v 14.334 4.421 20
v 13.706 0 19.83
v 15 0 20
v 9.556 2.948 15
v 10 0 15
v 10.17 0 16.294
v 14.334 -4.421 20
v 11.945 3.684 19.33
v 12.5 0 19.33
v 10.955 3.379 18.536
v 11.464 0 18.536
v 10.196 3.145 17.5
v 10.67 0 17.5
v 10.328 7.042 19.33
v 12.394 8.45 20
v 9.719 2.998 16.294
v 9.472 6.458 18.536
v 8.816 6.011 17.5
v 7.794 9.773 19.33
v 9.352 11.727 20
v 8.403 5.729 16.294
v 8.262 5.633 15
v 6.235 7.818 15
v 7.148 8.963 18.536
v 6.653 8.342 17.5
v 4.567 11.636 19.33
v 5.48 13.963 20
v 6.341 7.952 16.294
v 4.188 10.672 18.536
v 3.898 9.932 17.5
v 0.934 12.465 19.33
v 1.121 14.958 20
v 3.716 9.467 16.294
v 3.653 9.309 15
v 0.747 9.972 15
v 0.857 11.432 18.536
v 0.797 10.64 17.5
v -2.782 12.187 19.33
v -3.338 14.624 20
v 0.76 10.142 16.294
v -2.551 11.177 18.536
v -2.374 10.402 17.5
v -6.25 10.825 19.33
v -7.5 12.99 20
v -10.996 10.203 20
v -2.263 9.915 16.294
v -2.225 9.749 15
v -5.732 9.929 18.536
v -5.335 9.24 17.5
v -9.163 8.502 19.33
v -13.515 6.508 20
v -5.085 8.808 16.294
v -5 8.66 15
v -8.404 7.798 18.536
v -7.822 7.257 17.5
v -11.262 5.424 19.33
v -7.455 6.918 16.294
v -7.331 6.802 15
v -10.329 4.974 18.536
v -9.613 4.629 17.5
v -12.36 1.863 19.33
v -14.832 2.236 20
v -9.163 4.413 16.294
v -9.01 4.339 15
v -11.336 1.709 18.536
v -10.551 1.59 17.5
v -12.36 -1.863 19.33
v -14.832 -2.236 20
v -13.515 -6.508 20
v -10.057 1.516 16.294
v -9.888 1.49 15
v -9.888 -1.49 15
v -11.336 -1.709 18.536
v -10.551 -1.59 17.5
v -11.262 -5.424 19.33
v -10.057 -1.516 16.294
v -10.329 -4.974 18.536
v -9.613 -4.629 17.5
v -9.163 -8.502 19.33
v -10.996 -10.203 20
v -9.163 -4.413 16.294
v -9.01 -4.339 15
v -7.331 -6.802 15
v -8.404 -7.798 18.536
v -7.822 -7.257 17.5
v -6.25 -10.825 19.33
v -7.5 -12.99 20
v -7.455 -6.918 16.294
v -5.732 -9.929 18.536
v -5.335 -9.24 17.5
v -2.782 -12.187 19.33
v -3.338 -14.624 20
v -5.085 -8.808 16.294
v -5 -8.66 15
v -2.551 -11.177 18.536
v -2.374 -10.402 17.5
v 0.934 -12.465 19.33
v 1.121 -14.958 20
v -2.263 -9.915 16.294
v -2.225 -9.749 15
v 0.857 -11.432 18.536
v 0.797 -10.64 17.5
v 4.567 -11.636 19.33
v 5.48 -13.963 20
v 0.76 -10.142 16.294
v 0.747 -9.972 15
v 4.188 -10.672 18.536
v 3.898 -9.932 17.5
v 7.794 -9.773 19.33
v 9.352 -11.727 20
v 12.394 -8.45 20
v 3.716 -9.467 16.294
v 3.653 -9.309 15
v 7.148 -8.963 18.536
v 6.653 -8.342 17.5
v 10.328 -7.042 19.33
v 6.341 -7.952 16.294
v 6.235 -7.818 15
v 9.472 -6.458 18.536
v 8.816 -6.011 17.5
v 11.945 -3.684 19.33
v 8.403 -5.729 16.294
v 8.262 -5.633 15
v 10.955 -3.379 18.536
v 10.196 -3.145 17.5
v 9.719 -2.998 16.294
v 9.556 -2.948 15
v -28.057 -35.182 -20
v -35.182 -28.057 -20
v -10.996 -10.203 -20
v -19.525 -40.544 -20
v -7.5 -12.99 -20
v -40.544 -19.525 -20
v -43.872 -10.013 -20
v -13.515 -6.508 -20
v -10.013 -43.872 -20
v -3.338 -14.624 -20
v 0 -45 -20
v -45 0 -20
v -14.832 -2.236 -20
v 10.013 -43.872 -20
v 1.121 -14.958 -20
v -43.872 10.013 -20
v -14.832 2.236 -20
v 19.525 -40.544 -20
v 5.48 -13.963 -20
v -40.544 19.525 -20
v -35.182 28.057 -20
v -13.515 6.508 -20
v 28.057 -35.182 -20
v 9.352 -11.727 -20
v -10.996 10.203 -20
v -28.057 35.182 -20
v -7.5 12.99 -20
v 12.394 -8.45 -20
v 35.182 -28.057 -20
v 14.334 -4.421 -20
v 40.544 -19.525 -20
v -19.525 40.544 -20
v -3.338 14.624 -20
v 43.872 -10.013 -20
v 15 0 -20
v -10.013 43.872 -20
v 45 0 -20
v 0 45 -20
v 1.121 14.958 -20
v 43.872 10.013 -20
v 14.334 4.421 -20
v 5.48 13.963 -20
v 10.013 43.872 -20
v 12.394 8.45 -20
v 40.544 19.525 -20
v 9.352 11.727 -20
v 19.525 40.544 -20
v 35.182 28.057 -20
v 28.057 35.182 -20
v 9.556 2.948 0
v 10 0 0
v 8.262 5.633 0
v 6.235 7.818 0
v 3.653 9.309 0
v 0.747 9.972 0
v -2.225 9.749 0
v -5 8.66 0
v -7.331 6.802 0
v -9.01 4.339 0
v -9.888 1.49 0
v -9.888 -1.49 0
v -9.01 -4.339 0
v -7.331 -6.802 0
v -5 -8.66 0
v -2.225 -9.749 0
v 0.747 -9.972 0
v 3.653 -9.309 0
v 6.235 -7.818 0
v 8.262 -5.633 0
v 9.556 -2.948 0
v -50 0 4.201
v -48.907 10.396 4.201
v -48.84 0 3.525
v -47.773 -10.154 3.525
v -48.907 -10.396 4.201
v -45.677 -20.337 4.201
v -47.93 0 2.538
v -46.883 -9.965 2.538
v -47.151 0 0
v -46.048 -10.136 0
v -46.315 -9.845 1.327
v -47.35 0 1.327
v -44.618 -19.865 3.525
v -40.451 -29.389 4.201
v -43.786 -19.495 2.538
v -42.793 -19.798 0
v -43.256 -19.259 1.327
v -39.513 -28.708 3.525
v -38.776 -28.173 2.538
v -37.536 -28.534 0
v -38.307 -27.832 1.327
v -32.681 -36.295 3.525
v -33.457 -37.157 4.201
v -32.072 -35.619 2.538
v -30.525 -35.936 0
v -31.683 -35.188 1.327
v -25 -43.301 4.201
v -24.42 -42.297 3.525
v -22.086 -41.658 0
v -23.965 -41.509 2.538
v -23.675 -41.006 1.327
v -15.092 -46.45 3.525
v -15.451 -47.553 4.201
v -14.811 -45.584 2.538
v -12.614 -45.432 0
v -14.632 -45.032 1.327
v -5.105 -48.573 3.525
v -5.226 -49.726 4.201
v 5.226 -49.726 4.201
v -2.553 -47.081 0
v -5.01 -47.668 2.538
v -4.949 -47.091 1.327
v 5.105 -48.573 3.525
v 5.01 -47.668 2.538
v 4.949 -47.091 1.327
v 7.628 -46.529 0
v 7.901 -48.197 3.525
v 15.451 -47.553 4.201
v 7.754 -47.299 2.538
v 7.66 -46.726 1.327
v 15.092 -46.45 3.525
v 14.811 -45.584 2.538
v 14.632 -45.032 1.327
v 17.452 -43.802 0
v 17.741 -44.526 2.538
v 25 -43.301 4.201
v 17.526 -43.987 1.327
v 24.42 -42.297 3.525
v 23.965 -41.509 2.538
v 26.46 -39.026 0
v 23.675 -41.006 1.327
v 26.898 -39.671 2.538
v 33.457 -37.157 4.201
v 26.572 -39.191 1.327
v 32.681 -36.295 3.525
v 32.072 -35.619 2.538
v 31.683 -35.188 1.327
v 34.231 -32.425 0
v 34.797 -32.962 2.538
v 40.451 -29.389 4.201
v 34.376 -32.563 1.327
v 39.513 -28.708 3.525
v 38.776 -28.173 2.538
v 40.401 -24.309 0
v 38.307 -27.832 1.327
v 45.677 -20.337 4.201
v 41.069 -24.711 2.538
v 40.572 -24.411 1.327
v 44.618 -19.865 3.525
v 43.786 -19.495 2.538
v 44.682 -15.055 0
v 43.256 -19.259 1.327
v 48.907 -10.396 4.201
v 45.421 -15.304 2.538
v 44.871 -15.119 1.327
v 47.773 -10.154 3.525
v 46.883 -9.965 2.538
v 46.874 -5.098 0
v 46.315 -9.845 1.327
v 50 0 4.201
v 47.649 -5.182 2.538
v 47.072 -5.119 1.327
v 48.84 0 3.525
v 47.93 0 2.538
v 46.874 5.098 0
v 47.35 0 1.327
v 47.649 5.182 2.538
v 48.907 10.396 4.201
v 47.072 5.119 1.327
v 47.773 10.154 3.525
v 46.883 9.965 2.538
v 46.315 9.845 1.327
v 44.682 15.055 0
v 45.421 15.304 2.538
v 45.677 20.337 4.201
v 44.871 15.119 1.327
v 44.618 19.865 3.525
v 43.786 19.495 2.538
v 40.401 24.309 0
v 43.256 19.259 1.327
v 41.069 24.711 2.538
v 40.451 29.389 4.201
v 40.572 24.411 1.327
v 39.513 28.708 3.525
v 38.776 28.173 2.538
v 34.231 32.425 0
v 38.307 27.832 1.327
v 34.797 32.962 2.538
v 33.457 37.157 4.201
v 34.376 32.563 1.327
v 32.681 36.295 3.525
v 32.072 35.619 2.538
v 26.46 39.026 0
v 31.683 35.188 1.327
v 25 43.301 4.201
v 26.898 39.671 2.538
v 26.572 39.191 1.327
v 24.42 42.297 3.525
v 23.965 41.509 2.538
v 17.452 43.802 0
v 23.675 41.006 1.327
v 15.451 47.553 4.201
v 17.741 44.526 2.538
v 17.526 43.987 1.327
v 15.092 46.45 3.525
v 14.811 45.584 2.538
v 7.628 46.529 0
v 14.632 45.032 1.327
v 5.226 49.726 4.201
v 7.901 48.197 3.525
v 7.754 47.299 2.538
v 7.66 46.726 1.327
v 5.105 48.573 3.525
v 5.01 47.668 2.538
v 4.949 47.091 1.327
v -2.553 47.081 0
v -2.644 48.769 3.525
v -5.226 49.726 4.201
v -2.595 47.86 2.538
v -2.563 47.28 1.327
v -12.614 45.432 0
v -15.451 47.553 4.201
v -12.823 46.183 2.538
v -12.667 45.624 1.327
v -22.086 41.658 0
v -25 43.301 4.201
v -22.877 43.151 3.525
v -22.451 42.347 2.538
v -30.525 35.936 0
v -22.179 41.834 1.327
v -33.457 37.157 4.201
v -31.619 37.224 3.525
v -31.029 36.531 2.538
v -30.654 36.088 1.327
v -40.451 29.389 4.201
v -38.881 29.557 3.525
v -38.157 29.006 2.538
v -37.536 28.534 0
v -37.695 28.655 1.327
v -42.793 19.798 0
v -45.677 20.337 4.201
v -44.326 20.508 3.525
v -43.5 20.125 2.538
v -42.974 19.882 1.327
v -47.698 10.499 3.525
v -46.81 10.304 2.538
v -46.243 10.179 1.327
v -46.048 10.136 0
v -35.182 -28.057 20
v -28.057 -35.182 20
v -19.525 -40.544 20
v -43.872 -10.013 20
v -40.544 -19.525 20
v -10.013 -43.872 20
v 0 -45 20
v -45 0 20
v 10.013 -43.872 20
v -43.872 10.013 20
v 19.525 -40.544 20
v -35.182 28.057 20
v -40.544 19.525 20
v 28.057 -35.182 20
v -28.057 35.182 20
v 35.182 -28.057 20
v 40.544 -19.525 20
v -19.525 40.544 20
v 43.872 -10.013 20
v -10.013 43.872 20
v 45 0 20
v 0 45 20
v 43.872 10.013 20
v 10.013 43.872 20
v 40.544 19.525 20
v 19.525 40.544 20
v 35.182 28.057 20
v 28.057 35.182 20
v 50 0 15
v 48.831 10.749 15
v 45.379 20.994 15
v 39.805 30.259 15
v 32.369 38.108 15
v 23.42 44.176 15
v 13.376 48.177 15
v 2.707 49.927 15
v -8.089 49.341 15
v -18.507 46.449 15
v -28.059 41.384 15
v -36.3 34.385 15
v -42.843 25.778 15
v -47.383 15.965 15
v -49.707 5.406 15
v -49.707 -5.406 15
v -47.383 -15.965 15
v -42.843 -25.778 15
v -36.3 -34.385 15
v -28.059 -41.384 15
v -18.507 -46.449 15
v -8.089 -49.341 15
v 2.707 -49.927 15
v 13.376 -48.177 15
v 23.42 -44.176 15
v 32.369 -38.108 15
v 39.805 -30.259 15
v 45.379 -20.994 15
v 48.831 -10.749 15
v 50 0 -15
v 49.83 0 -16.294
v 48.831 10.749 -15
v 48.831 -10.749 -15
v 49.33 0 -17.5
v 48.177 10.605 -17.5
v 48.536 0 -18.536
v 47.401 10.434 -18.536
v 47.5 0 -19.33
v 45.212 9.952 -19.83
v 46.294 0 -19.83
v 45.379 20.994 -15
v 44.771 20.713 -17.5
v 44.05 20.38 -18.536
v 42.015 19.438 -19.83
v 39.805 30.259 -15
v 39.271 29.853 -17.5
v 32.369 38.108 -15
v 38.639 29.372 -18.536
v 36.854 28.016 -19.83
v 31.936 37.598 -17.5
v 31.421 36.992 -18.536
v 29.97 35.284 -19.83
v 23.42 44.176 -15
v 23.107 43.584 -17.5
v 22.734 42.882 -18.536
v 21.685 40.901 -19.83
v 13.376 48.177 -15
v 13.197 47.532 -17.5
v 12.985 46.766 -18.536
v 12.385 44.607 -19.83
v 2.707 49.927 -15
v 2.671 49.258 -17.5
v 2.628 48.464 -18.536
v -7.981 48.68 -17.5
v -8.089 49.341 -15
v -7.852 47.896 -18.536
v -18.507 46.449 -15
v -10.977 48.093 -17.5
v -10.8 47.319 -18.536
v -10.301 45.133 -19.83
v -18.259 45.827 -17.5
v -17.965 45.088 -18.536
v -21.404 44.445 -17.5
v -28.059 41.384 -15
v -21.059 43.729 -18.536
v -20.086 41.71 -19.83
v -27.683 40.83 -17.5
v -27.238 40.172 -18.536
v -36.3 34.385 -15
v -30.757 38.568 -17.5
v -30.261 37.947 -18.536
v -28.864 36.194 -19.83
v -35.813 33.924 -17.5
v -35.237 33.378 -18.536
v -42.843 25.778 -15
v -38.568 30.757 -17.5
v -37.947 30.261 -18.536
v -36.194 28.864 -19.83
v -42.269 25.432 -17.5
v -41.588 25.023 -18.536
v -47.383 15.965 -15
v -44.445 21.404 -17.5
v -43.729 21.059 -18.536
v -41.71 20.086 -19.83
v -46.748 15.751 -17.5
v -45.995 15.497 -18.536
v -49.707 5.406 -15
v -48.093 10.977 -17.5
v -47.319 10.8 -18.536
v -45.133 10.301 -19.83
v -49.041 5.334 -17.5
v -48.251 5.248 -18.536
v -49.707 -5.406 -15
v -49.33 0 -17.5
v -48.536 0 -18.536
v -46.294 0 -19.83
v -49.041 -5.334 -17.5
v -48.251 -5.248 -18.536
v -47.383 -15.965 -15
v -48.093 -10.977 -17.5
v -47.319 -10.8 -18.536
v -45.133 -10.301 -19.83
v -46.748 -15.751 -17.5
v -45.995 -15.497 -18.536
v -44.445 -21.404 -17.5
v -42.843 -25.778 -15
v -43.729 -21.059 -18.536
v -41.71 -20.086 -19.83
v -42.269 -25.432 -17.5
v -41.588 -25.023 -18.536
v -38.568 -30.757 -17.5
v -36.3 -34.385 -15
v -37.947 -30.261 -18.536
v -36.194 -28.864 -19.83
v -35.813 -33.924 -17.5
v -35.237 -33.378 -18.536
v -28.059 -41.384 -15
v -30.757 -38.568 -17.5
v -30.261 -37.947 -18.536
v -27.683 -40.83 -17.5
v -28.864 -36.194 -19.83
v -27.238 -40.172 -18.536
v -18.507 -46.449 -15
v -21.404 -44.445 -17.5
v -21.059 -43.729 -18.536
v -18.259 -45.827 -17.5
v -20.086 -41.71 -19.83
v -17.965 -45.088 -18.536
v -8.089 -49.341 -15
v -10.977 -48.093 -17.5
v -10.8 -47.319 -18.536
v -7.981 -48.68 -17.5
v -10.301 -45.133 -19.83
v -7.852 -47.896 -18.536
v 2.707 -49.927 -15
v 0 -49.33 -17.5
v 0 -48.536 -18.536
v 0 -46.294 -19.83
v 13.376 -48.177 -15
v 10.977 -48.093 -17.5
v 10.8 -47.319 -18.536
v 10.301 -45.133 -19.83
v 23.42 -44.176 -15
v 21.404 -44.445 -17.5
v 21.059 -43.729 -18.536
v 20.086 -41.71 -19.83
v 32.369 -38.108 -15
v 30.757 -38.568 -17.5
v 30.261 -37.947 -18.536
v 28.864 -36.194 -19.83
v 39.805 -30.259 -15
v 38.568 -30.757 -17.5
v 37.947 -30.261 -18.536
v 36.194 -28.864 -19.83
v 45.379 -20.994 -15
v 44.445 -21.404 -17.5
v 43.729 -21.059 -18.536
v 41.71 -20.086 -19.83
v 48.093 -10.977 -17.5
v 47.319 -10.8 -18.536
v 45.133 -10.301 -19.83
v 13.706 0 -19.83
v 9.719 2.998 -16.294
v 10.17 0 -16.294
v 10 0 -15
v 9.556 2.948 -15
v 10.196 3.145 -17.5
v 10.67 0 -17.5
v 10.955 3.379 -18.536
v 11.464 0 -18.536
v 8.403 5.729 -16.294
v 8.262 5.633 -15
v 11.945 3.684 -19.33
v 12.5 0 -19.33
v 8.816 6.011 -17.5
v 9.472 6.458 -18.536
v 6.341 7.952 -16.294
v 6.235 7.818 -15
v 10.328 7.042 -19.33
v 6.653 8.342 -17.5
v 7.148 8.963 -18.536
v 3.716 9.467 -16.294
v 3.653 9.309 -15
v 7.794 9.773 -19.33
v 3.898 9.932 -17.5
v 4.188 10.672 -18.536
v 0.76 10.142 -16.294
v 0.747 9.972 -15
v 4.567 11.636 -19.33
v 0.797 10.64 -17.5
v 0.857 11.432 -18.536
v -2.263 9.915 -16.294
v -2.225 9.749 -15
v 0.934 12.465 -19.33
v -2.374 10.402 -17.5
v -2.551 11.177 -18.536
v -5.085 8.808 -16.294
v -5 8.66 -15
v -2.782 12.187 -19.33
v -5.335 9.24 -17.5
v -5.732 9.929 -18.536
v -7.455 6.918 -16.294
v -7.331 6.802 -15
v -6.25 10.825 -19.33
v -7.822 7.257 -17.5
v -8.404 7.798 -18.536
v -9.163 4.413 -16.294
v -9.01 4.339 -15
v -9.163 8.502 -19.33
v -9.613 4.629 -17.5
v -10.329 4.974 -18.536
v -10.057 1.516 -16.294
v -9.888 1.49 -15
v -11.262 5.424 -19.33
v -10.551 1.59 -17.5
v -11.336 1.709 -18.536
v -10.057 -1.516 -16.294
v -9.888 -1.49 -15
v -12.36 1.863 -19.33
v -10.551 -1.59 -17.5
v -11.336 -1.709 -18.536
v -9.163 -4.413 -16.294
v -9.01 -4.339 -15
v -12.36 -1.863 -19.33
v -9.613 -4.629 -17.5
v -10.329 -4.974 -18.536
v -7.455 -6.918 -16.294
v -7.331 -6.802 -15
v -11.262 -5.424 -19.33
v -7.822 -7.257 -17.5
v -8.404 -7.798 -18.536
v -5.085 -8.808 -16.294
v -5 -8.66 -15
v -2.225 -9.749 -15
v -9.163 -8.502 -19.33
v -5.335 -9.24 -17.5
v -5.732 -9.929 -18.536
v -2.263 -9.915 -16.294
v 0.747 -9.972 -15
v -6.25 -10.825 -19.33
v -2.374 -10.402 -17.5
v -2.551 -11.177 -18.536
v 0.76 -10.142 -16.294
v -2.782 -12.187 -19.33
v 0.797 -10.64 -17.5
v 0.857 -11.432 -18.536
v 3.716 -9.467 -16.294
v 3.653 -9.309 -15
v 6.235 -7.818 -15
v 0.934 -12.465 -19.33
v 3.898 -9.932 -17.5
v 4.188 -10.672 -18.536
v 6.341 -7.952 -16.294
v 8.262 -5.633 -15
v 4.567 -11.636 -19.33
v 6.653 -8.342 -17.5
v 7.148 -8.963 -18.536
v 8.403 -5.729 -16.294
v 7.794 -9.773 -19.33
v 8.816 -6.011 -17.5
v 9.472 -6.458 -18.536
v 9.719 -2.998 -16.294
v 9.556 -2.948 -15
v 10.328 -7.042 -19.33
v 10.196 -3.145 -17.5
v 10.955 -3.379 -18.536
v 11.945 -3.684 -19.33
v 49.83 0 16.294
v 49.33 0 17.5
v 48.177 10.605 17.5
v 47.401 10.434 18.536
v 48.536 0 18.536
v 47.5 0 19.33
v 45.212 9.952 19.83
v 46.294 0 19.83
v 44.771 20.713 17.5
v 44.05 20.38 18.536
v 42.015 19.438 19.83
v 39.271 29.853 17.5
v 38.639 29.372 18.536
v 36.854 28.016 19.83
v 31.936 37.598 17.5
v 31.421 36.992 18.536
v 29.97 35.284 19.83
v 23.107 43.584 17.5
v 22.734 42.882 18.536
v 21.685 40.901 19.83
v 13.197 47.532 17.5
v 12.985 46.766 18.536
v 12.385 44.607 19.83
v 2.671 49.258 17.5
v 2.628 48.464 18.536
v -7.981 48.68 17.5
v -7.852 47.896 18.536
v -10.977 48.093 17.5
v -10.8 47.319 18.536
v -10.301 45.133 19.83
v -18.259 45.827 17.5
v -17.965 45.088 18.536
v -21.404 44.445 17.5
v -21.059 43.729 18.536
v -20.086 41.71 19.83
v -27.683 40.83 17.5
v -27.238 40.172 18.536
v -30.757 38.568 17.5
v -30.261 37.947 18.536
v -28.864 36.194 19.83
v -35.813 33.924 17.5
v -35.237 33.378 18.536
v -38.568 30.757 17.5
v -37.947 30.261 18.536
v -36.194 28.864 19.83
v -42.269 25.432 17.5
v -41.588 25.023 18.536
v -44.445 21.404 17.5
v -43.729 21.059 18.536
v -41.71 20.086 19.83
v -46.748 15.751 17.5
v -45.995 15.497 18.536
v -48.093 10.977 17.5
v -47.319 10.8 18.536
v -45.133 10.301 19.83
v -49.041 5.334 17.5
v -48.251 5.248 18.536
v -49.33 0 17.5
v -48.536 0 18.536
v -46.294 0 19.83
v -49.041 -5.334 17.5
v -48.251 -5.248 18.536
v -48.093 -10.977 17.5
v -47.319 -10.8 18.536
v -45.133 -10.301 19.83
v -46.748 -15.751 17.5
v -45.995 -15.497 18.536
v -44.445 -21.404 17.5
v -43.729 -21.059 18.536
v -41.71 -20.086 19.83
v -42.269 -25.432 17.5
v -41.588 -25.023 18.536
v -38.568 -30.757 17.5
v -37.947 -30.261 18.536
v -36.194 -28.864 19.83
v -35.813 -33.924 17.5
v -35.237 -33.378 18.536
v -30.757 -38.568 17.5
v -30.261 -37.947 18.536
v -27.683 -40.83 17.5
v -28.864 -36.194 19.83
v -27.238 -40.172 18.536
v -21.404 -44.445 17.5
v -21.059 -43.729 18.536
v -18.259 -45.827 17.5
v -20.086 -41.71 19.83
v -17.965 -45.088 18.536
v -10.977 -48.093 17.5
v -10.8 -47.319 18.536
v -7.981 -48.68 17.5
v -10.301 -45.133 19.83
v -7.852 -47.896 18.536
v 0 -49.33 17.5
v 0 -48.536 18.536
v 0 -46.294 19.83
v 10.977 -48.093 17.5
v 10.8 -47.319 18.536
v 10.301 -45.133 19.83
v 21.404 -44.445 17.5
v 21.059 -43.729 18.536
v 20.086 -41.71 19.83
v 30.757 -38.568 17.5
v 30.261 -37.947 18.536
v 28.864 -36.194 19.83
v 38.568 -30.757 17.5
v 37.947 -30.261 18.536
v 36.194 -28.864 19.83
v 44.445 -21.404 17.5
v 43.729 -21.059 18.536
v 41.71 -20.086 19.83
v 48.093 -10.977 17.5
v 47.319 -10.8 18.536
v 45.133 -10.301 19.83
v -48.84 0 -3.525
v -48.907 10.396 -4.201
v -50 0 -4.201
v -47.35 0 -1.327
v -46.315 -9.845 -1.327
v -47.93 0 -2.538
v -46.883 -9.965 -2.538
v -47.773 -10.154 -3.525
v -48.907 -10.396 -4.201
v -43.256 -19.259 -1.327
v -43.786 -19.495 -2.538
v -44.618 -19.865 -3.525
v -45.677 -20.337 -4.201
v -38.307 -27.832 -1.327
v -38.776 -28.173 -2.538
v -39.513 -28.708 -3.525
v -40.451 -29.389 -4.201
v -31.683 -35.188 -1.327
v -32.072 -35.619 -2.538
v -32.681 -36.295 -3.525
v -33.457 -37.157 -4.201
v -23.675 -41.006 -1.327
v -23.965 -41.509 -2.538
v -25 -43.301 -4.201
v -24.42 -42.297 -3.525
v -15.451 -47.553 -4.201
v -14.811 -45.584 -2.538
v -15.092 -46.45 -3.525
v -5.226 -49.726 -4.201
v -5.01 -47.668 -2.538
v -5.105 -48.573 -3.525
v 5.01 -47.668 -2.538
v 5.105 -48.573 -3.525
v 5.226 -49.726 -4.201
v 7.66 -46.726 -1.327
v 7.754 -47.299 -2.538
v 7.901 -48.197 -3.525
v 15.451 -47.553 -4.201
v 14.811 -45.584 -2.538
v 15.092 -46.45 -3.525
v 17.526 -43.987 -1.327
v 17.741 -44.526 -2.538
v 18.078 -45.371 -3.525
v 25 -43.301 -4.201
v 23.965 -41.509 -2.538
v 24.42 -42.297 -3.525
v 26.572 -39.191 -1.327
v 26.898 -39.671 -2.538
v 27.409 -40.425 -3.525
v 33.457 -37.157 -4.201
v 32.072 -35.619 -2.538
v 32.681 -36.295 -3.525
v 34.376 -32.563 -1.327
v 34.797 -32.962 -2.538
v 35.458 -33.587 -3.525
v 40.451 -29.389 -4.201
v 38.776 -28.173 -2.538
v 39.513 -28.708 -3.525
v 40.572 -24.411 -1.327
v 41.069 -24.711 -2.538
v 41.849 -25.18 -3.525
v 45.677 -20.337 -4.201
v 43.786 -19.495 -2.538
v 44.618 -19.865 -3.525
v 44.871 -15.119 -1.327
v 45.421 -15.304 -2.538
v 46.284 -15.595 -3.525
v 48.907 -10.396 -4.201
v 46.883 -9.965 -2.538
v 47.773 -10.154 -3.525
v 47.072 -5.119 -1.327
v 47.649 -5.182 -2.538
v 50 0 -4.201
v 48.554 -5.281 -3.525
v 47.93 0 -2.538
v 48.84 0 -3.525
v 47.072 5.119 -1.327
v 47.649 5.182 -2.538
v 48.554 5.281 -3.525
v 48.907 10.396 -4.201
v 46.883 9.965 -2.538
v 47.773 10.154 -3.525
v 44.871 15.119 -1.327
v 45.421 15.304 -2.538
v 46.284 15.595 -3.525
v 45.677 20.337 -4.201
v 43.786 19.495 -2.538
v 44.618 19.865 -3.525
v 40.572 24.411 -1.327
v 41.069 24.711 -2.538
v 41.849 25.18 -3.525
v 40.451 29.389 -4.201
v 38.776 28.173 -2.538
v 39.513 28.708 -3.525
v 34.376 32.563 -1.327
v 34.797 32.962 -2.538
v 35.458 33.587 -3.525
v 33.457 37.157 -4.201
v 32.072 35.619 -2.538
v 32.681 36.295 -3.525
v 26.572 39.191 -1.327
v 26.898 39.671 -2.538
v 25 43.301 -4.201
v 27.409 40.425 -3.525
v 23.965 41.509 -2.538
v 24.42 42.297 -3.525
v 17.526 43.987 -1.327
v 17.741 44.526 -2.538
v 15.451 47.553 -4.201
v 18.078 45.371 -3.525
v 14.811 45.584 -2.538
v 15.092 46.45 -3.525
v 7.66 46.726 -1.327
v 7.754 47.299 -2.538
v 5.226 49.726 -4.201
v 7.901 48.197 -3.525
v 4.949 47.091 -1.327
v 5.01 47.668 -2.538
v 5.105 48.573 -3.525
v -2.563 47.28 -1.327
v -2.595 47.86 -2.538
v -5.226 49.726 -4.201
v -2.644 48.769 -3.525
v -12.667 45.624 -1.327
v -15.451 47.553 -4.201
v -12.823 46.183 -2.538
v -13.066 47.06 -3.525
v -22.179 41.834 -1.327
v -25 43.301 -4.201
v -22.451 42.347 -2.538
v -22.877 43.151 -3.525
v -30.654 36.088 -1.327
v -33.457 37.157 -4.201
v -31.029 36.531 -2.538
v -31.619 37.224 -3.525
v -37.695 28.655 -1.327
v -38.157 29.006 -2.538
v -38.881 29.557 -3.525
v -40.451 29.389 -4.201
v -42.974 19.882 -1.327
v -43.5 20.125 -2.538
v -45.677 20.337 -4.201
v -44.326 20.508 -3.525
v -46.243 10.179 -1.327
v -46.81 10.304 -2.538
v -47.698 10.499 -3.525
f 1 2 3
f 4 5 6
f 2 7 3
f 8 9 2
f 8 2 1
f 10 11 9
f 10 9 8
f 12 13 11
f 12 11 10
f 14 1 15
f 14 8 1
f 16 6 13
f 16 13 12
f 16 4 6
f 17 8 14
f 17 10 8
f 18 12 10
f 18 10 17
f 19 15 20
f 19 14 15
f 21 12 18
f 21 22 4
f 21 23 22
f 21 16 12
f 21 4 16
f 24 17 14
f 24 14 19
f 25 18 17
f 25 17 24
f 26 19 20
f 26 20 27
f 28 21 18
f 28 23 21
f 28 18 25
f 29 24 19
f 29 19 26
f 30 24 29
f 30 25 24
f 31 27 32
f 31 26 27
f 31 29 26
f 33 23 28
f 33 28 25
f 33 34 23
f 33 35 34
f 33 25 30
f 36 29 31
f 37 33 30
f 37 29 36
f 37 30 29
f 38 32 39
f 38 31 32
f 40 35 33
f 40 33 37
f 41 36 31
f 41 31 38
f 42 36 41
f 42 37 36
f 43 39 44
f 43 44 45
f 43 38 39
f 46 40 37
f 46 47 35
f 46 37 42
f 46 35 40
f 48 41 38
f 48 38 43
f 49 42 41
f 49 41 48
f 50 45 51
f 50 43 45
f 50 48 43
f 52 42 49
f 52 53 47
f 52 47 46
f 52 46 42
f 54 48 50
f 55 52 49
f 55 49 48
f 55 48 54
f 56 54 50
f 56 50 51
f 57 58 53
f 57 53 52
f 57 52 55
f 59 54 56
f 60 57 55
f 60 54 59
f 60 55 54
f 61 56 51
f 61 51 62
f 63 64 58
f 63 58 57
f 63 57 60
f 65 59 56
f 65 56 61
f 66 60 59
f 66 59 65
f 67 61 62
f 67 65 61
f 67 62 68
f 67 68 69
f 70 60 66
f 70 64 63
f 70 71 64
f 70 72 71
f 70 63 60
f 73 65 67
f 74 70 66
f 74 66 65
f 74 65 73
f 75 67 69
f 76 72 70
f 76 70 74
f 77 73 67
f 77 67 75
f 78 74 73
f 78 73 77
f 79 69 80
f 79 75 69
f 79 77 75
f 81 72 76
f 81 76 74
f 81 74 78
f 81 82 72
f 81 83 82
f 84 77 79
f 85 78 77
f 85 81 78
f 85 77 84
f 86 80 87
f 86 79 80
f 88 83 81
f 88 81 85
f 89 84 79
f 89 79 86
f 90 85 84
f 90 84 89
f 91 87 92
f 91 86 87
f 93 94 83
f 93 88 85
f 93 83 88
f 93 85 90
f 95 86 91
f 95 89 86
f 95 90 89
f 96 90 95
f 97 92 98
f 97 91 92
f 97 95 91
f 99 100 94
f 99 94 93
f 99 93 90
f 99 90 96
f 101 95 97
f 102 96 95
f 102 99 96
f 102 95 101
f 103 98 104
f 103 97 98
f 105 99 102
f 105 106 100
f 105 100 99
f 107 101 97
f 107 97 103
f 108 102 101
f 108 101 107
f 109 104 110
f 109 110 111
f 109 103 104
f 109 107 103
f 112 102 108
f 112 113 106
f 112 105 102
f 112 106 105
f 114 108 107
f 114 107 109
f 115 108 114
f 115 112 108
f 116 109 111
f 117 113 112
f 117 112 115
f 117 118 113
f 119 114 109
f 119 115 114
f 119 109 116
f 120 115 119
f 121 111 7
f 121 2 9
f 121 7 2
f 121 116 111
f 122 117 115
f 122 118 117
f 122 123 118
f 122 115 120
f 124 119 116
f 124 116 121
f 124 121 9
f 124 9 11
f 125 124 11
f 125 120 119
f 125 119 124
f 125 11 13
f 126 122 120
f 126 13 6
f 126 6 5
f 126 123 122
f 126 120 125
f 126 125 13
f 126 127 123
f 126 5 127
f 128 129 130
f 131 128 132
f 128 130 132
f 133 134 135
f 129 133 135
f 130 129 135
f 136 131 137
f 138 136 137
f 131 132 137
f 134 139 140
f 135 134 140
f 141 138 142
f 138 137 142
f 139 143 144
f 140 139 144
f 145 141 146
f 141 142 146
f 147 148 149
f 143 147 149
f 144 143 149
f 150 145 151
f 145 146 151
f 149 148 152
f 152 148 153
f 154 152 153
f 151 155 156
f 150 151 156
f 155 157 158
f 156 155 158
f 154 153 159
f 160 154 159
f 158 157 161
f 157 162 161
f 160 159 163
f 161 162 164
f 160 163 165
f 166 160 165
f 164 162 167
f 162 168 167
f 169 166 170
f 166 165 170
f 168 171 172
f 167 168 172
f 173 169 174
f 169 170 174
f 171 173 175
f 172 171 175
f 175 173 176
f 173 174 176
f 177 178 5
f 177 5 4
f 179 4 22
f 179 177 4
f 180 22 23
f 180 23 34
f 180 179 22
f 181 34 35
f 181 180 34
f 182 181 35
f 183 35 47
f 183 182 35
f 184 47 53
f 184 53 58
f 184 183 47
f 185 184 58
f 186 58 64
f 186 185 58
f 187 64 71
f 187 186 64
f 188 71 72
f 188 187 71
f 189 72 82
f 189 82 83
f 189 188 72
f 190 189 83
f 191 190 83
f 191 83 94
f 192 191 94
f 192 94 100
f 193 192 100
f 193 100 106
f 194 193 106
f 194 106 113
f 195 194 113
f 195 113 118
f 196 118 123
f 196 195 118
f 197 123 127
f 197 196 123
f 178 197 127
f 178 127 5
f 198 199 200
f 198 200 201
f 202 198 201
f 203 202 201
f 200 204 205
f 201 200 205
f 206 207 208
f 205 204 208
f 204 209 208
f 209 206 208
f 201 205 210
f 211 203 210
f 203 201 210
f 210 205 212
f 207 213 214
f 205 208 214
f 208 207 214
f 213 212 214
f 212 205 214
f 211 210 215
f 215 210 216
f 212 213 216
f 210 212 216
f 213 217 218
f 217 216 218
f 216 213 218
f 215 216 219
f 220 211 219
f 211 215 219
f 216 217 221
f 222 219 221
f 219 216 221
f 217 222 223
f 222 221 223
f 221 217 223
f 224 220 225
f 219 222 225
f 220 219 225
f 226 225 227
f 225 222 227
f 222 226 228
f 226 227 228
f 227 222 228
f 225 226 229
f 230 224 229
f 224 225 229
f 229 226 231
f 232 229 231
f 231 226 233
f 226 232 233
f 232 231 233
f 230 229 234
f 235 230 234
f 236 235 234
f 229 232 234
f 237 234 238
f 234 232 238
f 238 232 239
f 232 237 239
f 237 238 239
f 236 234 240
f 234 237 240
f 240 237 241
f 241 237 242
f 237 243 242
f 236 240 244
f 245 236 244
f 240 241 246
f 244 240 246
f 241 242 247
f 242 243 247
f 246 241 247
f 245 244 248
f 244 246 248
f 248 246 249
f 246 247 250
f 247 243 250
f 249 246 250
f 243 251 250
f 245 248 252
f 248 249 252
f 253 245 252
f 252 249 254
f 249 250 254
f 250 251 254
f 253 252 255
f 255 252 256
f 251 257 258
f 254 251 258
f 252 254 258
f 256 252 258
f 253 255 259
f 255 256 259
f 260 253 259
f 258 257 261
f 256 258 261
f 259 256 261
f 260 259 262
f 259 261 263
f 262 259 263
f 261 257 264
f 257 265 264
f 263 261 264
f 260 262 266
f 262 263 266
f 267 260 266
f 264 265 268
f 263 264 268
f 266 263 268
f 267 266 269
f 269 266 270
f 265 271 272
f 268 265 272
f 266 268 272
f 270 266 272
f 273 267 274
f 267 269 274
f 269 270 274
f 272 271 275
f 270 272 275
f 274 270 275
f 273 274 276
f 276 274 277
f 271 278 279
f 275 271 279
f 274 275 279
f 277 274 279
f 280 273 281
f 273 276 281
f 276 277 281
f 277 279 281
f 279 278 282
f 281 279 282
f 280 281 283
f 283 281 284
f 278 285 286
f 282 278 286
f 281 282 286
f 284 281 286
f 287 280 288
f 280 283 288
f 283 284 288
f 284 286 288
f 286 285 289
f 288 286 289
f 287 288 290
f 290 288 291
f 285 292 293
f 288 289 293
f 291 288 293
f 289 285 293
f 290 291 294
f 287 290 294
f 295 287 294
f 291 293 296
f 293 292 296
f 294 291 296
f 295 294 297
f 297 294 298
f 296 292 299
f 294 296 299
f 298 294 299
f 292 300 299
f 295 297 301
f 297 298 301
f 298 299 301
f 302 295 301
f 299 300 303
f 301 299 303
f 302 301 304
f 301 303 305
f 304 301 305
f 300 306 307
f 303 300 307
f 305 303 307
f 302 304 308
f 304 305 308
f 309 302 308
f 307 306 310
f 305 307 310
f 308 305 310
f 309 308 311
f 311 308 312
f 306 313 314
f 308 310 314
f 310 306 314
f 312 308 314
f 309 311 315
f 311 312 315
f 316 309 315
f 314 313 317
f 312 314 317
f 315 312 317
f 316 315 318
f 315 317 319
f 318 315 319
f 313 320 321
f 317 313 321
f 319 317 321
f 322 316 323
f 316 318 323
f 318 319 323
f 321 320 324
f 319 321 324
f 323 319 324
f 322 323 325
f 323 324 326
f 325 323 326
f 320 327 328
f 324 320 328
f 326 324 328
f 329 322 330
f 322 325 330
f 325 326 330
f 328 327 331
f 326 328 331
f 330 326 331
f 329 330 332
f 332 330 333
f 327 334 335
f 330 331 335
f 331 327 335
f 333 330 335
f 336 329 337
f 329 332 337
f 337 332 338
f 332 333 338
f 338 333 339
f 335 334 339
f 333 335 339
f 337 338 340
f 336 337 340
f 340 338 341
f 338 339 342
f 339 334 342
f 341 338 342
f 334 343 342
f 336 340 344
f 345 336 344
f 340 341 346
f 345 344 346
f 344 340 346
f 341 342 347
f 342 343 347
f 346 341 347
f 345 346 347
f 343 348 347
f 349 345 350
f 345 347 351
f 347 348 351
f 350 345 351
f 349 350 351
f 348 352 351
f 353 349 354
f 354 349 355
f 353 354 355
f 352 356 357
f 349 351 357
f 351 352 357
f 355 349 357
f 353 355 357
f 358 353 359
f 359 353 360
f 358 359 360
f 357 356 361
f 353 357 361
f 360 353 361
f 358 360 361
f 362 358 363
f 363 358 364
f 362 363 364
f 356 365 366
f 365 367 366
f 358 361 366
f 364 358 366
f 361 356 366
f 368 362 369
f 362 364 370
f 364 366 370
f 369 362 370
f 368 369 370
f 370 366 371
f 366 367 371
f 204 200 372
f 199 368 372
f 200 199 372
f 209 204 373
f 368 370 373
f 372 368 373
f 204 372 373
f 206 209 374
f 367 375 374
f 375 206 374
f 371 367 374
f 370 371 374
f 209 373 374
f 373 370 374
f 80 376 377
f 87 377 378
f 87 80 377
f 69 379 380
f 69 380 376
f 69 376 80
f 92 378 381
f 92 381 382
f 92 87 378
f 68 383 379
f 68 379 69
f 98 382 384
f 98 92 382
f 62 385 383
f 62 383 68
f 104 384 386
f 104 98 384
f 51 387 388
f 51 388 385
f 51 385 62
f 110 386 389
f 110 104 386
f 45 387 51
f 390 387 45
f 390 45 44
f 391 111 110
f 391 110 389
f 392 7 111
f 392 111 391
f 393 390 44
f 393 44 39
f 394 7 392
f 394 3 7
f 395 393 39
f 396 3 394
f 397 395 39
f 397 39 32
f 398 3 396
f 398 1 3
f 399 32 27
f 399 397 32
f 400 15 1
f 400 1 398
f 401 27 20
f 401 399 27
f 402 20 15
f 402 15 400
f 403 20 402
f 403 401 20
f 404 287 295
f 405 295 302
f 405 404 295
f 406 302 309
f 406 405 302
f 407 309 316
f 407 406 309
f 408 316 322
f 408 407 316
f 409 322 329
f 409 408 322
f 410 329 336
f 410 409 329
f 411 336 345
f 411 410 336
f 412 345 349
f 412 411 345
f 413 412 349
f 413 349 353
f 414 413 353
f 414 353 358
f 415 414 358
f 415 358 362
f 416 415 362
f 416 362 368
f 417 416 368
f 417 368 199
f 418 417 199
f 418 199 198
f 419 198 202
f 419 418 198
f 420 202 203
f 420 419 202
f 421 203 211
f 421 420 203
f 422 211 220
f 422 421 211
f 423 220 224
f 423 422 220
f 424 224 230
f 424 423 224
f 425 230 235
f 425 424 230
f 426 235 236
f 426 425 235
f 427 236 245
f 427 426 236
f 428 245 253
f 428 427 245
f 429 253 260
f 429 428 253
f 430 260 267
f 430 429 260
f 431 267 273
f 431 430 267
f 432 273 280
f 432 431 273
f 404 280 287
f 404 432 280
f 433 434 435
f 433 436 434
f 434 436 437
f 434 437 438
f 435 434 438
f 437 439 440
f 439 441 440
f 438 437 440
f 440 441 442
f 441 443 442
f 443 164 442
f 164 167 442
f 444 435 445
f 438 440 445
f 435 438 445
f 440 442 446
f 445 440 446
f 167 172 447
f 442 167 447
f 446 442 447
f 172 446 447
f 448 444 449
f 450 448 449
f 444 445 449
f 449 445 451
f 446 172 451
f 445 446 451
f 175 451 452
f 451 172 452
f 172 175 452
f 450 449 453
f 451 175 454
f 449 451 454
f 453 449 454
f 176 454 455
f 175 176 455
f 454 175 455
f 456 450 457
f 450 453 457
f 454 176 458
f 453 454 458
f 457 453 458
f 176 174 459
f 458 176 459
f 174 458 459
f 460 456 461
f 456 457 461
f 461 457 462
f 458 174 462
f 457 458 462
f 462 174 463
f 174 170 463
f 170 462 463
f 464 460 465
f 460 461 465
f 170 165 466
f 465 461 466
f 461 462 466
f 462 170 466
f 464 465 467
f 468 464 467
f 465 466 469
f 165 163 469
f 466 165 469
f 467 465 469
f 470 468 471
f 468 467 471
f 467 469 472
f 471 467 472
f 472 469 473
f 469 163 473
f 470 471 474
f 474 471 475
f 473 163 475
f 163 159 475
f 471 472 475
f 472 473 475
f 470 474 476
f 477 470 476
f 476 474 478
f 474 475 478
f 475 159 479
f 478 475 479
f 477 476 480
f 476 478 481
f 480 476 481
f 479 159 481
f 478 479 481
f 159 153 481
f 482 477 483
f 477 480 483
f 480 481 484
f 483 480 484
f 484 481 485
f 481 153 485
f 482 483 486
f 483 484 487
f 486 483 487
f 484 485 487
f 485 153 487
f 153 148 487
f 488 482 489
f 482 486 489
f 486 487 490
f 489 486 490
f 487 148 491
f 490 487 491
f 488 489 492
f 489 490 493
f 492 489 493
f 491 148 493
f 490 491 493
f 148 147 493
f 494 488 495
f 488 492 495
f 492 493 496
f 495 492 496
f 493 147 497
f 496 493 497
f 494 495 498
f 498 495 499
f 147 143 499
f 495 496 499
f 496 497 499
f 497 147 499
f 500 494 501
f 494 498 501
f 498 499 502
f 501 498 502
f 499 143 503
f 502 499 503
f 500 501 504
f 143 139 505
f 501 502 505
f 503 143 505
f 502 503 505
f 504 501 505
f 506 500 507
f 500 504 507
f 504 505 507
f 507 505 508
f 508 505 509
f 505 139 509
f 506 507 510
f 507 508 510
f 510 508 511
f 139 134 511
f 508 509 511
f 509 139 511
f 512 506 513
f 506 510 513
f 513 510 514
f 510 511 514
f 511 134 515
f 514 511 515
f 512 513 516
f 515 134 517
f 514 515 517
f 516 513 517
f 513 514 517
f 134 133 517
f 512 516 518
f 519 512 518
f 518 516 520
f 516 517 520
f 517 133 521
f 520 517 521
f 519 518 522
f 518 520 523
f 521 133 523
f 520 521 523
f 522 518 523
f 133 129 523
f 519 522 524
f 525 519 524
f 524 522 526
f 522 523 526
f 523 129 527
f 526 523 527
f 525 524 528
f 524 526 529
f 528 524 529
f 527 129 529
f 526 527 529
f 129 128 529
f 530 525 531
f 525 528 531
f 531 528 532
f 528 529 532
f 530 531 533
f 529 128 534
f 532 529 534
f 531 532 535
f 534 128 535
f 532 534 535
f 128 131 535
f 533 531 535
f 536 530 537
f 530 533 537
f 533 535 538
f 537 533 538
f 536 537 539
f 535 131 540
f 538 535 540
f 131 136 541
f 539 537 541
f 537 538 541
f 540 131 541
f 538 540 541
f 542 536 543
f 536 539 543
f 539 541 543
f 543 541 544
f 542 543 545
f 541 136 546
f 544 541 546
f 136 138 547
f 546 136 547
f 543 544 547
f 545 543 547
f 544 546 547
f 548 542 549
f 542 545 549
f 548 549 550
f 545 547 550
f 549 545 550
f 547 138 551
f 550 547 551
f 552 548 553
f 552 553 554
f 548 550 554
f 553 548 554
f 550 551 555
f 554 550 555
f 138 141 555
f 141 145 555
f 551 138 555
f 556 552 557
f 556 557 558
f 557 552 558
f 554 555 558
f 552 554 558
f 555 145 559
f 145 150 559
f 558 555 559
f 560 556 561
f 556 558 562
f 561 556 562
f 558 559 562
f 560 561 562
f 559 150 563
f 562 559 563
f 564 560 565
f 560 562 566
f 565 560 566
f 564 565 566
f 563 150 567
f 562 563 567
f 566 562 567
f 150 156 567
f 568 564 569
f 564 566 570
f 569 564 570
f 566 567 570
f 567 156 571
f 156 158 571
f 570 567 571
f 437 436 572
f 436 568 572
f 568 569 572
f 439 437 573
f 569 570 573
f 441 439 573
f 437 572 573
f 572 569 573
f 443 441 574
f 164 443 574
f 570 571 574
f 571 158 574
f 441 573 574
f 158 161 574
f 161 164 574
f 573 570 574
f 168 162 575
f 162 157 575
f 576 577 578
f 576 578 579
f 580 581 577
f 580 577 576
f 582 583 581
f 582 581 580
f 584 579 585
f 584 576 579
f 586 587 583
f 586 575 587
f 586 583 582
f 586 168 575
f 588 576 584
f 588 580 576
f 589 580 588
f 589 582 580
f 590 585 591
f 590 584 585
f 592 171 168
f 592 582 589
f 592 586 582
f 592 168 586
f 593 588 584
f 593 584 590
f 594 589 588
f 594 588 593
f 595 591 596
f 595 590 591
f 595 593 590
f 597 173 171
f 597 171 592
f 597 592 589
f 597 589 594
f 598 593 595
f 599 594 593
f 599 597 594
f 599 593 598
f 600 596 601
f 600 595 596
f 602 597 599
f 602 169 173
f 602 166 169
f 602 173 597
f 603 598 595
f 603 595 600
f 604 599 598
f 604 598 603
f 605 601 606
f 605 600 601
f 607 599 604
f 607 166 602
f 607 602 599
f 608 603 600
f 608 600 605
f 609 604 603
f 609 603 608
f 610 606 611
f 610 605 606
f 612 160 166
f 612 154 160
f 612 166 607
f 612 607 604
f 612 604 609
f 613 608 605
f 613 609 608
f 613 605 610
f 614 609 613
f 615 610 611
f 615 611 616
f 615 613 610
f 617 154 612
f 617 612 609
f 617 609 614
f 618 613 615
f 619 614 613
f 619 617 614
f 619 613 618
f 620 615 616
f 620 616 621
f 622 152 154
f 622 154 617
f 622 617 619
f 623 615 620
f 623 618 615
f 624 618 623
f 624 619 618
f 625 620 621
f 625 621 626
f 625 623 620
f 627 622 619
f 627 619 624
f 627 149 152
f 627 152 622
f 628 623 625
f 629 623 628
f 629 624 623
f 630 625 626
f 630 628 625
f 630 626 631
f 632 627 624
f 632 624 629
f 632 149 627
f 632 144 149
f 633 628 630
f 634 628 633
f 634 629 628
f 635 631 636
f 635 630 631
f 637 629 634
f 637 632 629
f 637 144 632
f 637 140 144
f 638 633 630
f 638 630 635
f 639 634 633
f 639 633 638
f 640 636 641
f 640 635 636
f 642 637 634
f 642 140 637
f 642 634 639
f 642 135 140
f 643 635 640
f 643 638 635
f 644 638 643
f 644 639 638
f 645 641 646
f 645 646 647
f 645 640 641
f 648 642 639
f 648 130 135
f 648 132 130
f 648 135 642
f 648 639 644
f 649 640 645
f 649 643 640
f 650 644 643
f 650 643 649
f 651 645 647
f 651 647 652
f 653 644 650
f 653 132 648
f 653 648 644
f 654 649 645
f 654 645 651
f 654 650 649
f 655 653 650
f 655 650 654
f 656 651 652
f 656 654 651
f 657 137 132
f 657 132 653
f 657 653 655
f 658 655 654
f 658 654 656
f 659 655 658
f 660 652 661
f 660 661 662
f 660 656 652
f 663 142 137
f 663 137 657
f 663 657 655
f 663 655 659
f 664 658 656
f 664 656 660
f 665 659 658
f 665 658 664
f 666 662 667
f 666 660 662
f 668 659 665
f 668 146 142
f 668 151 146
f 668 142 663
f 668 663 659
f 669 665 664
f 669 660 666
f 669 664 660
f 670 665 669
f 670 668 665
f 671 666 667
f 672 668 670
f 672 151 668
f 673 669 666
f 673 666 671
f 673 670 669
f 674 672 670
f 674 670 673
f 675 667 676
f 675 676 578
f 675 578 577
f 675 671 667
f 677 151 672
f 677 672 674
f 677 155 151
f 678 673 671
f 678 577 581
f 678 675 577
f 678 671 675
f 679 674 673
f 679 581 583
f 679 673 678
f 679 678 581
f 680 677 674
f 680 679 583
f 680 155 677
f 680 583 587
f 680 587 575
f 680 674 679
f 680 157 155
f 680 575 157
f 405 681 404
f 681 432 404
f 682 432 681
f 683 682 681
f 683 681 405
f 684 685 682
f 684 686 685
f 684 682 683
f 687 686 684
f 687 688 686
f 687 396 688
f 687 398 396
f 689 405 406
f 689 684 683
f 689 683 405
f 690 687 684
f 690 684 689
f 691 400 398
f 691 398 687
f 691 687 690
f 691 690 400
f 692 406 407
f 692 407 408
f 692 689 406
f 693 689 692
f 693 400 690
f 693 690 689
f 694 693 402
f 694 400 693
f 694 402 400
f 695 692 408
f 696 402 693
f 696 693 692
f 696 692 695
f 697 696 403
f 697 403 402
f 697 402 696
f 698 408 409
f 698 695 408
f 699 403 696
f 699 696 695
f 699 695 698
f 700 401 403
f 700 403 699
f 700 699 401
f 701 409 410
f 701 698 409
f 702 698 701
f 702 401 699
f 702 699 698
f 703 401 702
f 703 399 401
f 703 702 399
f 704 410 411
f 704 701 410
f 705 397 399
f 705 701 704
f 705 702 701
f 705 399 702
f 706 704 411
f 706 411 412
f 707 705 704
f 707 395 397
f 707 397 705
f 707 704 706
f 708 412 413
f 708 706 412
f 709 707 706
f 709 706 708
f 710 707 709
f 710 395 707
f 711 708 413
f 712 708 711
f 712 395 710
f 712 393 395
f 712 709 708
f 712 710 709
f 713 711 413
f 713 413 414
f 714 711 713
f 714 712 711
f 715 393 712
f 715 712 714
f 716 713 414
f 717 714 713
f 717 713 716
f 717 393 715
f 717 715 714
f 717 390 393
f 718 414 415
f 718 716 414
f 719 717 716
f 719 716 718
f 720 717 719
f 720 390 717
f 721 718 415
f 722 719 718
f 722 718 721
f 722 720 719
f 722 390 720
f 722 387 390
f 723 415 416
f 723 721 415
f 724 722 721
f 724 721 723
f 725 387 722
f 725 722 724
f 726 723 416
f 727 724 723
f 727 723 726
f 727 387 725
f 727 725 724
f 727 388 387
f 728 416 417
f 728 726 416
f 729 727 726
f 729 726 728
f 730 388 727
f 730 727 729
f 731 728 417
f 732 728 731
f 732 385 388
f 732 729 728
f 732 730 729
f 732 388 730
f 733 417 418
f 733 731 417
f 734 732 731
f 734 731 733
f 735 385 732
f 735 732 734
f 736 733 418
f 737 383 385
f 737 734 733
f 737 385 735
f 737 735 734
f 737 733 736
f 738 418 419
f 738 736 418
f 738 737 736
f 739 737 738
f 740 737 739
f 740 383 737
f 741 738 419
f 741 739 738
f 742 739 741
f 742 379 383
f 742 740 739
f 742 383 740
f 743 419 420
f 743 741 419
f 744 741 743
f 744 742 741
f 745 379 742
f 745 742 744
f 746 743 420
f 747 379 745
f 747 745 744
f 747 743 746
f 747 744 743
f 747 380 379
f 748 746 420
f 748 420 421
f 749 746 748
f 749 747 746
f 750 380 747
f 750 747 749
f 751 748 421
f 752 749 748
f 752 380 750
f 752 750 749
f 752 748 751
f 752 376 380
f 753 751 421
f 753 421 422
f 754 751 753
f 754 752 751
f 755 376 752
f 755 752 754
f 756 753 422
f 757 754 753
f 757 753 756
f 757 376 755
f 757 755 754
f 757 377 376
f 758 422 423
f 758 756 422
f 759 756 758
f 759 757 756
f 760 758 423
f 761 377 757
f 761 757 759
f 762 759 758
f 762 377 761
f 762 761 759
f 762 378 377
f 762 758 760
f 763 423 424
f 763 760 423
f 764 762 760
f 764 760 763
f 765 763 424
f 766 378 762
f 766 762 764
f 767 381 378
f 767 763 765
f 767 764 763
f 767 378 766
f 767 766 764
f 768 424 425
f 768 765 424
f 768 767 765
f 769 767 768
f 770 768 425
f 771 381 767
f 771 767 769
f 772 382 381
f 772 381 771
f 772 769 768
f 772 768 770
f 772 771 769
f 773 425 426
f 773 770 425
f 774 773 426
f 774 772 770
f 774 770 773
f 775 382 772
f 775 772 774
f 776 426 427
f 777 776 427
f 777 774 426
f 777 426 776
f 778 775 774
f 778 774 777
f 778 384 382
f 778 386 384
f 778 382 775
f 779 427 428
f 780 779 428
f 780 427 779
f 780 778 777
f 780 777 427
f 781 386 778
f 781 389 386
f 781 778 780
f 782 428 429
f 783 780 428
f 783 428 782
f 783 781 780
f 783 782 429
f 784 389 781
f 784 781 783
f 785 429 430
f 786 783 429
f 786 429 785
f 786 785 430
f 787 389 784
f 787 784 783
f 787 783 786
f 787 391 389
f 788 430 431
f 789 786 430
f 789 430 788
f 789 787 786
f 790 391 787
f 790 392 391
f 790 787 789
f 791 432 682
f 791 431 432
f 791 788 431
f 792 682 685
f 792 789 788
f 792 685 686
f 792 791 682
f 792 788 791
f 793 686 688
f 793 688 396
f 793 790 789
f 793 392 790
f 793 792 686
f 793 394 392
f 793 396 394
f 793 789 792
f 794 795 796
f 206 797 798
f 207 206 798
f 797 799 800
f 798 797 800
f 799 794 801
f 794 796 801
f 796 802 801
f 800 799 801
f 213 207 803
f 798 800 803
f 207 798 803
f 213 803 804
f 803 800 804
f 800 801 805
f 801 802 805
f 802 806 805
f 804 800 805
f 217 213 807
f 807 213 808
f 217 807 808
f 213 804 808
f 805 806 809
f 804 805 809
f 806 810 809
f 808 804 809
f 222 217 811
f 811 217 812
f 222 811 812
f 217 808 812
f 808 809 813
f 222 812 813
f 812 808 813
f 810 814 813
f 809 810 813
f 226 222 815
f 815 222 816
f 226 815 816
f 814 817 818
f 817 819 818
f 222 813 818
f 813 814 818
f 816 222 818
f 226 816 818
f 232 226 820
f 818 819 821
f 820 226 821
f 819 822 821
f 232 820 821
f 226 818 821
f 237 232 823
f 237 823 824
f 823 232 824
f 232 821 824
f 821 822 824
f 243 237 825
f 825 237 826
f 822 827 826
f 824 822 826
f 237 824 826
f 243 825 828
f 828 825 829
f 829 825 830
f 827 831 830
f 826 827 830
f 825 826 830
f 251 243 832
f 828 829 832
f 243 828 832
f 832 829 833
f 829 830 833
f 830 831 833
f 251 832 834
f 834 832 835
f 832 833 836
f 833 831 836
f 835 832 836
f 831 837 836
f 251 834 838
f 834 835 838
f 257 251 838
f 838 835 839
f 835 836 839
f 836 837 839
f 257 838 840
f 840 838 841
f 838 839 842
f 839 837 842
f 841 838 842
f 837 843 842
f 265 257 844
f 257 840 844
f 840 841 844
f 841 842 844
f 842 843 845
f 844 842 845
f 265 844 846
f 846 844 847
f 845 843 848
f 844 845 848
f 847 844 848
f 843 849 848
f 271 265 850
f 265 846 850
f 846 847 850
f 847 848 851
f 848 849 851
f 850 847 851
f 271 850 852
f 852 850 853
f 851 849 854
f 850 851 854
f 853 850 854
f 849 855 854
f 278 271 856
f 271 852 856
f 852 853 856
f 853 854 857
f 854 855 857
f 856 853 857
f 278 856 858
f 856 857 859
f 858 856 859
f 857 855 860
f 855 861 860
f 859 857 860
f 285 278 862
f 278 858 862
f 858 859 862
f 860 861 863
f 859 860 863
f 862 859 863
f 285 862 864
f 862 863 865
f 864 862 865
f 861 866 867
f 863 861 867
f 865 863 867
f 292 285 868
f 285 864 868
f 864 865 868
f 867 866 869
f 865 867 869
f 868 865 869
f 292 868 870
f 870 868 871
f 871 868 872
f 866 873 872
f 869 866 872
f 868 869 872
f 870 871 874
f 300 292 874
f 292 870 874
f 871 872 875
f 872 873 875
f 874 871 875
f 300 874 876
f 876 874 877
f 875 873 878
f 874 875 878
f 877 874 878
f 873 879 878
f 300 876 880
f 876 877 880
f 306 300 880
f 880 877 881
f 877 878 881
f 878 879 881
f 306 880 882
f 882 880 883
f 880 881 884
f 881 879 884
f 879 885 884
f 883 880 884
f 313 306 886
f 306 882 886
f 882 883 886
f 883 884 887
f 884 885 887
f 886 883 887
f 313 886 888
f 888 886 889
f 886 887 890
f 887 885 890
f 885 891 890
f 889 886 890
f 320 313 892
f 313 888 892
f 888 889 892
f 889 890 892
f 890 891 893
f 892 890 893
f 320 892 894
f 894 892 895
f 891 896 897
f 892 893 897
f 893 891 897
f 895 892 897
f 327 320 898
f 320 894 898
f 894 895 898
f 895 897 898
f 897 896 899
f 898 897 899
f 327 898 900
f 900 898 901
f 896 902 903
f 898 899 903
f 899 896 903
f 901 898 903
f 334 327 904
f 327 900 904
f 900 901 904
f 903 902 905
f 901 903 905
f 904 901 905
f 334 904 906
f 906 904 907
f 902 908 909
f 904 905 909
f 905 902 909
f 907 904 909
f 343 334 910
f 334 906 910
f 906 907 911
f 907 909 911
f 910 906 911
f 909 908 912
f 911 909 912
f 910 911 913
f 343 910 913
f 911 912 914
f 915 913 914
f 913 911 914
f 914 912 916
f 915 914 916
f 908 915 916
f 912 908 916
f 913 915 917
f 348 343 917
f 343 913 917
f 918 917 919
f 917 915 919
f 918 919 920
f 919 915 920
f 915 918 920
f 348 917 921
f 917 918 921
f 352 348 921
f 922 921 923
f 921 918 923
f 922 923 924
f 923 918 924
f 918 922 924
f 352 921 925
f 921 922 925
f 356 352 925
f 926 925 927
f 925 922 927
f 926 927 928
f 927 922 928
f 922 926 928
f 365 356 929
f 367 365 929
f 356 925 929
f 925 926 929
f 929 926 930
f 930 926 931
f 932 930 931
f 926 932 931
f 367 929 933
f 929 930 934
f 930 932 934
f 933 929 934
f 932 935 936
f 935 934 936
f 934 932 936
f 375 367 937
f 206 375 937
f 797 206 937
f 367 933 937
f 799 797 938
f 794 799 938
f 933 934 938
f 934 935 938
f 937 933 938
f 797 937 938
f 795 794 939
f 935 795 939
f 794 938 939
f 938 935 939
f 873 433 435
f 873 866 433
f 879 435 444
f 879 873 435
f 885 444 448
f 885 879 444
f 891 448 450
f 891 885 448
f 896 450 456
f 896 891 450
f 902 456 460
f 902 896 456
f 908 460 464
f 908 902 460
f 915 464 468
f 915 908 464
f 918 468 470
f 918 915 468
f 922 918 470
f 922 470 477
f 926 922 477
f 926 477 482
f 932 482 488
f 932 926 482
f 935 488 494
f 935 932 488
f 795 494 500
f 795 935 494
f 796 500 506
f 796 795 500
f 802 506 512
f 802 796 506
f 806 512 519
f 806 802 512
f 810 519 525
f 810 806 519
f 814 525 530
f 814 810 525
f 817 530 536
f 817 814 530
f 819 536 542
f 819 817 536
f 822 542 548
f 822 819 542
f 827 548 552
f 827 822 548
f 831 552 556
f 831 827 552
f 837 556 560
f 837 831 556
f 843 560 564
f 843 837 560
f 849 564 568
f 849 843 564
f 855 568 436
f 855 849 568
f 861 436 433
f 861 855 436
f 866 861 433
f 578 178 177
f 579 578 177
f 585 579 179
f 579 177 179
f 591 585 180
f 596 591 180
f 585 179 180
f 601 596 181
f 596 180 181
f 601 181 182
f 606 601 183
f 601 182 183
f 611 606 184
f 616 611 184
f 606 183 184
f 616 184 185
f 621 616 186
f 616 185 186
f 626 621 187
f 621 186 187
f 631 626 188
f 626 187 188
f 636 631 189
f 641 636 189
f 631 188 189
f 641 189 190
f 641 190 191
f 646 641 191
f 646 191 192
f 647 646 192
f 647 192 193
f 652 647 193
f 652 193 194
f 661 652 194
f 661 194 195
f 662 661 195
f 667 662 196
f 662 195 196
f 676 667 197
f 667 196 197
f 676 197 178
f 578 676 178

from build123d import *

# Parameters (mm, degrees)
BOSS_EXTRUDE1_DEPTH      = 20
BOSS_EXTRUDE1_DEPTH_BACK = 20
SKETCH1_R                = 50
SKETCH1_R_2              = 10
FILLET1_R                = 5
SKETCH3_R                = 4.520910571


with BuildPart() as part:
    # Sketch1 → Boss-Extrude1 (new, two sides: drawn at the far end of the back side and taken through both)
    with BuildSketch(Plane.XY.offset(-BOSS_EXTRUDE1_DEPTH_BACK)):
        Circle(SKETCH1_R)
        Circle(SKETCH1_R_2, mode=Mode.SUBTRACT)
    extrude(amount=BOSS_EXTRUDE1_DEPTH + BOSS_EXTRUDE1_DEPTH_BACK)

    # Fillet1
    fillet1_edges = [part.edges().sort_by_distance(p)[0] for p in [
        (-10, 0, -20),
        (-10, 0, 20),
        (-50, 0, 20),
        (-50, 0, -20),
    ]]
    fillet(fillet1_edges, radius=FILLET1_R)

    # Sketch3 → Cut-Revolve1 (revolve, cut)
    with BuildSketch(Plane(origin=(0, 0, 0), x_dir=(1, 0, 0), z_dir=(0, 1, 0))):
        with Locations((-51.671542469, 0)):
            Circle(SKETCH3_R)
    revolve(axis=Axis((0, 0, -9.930437496), (0, 0, 1)), mode=Mode.SUBTRACT)


solid = part.part
